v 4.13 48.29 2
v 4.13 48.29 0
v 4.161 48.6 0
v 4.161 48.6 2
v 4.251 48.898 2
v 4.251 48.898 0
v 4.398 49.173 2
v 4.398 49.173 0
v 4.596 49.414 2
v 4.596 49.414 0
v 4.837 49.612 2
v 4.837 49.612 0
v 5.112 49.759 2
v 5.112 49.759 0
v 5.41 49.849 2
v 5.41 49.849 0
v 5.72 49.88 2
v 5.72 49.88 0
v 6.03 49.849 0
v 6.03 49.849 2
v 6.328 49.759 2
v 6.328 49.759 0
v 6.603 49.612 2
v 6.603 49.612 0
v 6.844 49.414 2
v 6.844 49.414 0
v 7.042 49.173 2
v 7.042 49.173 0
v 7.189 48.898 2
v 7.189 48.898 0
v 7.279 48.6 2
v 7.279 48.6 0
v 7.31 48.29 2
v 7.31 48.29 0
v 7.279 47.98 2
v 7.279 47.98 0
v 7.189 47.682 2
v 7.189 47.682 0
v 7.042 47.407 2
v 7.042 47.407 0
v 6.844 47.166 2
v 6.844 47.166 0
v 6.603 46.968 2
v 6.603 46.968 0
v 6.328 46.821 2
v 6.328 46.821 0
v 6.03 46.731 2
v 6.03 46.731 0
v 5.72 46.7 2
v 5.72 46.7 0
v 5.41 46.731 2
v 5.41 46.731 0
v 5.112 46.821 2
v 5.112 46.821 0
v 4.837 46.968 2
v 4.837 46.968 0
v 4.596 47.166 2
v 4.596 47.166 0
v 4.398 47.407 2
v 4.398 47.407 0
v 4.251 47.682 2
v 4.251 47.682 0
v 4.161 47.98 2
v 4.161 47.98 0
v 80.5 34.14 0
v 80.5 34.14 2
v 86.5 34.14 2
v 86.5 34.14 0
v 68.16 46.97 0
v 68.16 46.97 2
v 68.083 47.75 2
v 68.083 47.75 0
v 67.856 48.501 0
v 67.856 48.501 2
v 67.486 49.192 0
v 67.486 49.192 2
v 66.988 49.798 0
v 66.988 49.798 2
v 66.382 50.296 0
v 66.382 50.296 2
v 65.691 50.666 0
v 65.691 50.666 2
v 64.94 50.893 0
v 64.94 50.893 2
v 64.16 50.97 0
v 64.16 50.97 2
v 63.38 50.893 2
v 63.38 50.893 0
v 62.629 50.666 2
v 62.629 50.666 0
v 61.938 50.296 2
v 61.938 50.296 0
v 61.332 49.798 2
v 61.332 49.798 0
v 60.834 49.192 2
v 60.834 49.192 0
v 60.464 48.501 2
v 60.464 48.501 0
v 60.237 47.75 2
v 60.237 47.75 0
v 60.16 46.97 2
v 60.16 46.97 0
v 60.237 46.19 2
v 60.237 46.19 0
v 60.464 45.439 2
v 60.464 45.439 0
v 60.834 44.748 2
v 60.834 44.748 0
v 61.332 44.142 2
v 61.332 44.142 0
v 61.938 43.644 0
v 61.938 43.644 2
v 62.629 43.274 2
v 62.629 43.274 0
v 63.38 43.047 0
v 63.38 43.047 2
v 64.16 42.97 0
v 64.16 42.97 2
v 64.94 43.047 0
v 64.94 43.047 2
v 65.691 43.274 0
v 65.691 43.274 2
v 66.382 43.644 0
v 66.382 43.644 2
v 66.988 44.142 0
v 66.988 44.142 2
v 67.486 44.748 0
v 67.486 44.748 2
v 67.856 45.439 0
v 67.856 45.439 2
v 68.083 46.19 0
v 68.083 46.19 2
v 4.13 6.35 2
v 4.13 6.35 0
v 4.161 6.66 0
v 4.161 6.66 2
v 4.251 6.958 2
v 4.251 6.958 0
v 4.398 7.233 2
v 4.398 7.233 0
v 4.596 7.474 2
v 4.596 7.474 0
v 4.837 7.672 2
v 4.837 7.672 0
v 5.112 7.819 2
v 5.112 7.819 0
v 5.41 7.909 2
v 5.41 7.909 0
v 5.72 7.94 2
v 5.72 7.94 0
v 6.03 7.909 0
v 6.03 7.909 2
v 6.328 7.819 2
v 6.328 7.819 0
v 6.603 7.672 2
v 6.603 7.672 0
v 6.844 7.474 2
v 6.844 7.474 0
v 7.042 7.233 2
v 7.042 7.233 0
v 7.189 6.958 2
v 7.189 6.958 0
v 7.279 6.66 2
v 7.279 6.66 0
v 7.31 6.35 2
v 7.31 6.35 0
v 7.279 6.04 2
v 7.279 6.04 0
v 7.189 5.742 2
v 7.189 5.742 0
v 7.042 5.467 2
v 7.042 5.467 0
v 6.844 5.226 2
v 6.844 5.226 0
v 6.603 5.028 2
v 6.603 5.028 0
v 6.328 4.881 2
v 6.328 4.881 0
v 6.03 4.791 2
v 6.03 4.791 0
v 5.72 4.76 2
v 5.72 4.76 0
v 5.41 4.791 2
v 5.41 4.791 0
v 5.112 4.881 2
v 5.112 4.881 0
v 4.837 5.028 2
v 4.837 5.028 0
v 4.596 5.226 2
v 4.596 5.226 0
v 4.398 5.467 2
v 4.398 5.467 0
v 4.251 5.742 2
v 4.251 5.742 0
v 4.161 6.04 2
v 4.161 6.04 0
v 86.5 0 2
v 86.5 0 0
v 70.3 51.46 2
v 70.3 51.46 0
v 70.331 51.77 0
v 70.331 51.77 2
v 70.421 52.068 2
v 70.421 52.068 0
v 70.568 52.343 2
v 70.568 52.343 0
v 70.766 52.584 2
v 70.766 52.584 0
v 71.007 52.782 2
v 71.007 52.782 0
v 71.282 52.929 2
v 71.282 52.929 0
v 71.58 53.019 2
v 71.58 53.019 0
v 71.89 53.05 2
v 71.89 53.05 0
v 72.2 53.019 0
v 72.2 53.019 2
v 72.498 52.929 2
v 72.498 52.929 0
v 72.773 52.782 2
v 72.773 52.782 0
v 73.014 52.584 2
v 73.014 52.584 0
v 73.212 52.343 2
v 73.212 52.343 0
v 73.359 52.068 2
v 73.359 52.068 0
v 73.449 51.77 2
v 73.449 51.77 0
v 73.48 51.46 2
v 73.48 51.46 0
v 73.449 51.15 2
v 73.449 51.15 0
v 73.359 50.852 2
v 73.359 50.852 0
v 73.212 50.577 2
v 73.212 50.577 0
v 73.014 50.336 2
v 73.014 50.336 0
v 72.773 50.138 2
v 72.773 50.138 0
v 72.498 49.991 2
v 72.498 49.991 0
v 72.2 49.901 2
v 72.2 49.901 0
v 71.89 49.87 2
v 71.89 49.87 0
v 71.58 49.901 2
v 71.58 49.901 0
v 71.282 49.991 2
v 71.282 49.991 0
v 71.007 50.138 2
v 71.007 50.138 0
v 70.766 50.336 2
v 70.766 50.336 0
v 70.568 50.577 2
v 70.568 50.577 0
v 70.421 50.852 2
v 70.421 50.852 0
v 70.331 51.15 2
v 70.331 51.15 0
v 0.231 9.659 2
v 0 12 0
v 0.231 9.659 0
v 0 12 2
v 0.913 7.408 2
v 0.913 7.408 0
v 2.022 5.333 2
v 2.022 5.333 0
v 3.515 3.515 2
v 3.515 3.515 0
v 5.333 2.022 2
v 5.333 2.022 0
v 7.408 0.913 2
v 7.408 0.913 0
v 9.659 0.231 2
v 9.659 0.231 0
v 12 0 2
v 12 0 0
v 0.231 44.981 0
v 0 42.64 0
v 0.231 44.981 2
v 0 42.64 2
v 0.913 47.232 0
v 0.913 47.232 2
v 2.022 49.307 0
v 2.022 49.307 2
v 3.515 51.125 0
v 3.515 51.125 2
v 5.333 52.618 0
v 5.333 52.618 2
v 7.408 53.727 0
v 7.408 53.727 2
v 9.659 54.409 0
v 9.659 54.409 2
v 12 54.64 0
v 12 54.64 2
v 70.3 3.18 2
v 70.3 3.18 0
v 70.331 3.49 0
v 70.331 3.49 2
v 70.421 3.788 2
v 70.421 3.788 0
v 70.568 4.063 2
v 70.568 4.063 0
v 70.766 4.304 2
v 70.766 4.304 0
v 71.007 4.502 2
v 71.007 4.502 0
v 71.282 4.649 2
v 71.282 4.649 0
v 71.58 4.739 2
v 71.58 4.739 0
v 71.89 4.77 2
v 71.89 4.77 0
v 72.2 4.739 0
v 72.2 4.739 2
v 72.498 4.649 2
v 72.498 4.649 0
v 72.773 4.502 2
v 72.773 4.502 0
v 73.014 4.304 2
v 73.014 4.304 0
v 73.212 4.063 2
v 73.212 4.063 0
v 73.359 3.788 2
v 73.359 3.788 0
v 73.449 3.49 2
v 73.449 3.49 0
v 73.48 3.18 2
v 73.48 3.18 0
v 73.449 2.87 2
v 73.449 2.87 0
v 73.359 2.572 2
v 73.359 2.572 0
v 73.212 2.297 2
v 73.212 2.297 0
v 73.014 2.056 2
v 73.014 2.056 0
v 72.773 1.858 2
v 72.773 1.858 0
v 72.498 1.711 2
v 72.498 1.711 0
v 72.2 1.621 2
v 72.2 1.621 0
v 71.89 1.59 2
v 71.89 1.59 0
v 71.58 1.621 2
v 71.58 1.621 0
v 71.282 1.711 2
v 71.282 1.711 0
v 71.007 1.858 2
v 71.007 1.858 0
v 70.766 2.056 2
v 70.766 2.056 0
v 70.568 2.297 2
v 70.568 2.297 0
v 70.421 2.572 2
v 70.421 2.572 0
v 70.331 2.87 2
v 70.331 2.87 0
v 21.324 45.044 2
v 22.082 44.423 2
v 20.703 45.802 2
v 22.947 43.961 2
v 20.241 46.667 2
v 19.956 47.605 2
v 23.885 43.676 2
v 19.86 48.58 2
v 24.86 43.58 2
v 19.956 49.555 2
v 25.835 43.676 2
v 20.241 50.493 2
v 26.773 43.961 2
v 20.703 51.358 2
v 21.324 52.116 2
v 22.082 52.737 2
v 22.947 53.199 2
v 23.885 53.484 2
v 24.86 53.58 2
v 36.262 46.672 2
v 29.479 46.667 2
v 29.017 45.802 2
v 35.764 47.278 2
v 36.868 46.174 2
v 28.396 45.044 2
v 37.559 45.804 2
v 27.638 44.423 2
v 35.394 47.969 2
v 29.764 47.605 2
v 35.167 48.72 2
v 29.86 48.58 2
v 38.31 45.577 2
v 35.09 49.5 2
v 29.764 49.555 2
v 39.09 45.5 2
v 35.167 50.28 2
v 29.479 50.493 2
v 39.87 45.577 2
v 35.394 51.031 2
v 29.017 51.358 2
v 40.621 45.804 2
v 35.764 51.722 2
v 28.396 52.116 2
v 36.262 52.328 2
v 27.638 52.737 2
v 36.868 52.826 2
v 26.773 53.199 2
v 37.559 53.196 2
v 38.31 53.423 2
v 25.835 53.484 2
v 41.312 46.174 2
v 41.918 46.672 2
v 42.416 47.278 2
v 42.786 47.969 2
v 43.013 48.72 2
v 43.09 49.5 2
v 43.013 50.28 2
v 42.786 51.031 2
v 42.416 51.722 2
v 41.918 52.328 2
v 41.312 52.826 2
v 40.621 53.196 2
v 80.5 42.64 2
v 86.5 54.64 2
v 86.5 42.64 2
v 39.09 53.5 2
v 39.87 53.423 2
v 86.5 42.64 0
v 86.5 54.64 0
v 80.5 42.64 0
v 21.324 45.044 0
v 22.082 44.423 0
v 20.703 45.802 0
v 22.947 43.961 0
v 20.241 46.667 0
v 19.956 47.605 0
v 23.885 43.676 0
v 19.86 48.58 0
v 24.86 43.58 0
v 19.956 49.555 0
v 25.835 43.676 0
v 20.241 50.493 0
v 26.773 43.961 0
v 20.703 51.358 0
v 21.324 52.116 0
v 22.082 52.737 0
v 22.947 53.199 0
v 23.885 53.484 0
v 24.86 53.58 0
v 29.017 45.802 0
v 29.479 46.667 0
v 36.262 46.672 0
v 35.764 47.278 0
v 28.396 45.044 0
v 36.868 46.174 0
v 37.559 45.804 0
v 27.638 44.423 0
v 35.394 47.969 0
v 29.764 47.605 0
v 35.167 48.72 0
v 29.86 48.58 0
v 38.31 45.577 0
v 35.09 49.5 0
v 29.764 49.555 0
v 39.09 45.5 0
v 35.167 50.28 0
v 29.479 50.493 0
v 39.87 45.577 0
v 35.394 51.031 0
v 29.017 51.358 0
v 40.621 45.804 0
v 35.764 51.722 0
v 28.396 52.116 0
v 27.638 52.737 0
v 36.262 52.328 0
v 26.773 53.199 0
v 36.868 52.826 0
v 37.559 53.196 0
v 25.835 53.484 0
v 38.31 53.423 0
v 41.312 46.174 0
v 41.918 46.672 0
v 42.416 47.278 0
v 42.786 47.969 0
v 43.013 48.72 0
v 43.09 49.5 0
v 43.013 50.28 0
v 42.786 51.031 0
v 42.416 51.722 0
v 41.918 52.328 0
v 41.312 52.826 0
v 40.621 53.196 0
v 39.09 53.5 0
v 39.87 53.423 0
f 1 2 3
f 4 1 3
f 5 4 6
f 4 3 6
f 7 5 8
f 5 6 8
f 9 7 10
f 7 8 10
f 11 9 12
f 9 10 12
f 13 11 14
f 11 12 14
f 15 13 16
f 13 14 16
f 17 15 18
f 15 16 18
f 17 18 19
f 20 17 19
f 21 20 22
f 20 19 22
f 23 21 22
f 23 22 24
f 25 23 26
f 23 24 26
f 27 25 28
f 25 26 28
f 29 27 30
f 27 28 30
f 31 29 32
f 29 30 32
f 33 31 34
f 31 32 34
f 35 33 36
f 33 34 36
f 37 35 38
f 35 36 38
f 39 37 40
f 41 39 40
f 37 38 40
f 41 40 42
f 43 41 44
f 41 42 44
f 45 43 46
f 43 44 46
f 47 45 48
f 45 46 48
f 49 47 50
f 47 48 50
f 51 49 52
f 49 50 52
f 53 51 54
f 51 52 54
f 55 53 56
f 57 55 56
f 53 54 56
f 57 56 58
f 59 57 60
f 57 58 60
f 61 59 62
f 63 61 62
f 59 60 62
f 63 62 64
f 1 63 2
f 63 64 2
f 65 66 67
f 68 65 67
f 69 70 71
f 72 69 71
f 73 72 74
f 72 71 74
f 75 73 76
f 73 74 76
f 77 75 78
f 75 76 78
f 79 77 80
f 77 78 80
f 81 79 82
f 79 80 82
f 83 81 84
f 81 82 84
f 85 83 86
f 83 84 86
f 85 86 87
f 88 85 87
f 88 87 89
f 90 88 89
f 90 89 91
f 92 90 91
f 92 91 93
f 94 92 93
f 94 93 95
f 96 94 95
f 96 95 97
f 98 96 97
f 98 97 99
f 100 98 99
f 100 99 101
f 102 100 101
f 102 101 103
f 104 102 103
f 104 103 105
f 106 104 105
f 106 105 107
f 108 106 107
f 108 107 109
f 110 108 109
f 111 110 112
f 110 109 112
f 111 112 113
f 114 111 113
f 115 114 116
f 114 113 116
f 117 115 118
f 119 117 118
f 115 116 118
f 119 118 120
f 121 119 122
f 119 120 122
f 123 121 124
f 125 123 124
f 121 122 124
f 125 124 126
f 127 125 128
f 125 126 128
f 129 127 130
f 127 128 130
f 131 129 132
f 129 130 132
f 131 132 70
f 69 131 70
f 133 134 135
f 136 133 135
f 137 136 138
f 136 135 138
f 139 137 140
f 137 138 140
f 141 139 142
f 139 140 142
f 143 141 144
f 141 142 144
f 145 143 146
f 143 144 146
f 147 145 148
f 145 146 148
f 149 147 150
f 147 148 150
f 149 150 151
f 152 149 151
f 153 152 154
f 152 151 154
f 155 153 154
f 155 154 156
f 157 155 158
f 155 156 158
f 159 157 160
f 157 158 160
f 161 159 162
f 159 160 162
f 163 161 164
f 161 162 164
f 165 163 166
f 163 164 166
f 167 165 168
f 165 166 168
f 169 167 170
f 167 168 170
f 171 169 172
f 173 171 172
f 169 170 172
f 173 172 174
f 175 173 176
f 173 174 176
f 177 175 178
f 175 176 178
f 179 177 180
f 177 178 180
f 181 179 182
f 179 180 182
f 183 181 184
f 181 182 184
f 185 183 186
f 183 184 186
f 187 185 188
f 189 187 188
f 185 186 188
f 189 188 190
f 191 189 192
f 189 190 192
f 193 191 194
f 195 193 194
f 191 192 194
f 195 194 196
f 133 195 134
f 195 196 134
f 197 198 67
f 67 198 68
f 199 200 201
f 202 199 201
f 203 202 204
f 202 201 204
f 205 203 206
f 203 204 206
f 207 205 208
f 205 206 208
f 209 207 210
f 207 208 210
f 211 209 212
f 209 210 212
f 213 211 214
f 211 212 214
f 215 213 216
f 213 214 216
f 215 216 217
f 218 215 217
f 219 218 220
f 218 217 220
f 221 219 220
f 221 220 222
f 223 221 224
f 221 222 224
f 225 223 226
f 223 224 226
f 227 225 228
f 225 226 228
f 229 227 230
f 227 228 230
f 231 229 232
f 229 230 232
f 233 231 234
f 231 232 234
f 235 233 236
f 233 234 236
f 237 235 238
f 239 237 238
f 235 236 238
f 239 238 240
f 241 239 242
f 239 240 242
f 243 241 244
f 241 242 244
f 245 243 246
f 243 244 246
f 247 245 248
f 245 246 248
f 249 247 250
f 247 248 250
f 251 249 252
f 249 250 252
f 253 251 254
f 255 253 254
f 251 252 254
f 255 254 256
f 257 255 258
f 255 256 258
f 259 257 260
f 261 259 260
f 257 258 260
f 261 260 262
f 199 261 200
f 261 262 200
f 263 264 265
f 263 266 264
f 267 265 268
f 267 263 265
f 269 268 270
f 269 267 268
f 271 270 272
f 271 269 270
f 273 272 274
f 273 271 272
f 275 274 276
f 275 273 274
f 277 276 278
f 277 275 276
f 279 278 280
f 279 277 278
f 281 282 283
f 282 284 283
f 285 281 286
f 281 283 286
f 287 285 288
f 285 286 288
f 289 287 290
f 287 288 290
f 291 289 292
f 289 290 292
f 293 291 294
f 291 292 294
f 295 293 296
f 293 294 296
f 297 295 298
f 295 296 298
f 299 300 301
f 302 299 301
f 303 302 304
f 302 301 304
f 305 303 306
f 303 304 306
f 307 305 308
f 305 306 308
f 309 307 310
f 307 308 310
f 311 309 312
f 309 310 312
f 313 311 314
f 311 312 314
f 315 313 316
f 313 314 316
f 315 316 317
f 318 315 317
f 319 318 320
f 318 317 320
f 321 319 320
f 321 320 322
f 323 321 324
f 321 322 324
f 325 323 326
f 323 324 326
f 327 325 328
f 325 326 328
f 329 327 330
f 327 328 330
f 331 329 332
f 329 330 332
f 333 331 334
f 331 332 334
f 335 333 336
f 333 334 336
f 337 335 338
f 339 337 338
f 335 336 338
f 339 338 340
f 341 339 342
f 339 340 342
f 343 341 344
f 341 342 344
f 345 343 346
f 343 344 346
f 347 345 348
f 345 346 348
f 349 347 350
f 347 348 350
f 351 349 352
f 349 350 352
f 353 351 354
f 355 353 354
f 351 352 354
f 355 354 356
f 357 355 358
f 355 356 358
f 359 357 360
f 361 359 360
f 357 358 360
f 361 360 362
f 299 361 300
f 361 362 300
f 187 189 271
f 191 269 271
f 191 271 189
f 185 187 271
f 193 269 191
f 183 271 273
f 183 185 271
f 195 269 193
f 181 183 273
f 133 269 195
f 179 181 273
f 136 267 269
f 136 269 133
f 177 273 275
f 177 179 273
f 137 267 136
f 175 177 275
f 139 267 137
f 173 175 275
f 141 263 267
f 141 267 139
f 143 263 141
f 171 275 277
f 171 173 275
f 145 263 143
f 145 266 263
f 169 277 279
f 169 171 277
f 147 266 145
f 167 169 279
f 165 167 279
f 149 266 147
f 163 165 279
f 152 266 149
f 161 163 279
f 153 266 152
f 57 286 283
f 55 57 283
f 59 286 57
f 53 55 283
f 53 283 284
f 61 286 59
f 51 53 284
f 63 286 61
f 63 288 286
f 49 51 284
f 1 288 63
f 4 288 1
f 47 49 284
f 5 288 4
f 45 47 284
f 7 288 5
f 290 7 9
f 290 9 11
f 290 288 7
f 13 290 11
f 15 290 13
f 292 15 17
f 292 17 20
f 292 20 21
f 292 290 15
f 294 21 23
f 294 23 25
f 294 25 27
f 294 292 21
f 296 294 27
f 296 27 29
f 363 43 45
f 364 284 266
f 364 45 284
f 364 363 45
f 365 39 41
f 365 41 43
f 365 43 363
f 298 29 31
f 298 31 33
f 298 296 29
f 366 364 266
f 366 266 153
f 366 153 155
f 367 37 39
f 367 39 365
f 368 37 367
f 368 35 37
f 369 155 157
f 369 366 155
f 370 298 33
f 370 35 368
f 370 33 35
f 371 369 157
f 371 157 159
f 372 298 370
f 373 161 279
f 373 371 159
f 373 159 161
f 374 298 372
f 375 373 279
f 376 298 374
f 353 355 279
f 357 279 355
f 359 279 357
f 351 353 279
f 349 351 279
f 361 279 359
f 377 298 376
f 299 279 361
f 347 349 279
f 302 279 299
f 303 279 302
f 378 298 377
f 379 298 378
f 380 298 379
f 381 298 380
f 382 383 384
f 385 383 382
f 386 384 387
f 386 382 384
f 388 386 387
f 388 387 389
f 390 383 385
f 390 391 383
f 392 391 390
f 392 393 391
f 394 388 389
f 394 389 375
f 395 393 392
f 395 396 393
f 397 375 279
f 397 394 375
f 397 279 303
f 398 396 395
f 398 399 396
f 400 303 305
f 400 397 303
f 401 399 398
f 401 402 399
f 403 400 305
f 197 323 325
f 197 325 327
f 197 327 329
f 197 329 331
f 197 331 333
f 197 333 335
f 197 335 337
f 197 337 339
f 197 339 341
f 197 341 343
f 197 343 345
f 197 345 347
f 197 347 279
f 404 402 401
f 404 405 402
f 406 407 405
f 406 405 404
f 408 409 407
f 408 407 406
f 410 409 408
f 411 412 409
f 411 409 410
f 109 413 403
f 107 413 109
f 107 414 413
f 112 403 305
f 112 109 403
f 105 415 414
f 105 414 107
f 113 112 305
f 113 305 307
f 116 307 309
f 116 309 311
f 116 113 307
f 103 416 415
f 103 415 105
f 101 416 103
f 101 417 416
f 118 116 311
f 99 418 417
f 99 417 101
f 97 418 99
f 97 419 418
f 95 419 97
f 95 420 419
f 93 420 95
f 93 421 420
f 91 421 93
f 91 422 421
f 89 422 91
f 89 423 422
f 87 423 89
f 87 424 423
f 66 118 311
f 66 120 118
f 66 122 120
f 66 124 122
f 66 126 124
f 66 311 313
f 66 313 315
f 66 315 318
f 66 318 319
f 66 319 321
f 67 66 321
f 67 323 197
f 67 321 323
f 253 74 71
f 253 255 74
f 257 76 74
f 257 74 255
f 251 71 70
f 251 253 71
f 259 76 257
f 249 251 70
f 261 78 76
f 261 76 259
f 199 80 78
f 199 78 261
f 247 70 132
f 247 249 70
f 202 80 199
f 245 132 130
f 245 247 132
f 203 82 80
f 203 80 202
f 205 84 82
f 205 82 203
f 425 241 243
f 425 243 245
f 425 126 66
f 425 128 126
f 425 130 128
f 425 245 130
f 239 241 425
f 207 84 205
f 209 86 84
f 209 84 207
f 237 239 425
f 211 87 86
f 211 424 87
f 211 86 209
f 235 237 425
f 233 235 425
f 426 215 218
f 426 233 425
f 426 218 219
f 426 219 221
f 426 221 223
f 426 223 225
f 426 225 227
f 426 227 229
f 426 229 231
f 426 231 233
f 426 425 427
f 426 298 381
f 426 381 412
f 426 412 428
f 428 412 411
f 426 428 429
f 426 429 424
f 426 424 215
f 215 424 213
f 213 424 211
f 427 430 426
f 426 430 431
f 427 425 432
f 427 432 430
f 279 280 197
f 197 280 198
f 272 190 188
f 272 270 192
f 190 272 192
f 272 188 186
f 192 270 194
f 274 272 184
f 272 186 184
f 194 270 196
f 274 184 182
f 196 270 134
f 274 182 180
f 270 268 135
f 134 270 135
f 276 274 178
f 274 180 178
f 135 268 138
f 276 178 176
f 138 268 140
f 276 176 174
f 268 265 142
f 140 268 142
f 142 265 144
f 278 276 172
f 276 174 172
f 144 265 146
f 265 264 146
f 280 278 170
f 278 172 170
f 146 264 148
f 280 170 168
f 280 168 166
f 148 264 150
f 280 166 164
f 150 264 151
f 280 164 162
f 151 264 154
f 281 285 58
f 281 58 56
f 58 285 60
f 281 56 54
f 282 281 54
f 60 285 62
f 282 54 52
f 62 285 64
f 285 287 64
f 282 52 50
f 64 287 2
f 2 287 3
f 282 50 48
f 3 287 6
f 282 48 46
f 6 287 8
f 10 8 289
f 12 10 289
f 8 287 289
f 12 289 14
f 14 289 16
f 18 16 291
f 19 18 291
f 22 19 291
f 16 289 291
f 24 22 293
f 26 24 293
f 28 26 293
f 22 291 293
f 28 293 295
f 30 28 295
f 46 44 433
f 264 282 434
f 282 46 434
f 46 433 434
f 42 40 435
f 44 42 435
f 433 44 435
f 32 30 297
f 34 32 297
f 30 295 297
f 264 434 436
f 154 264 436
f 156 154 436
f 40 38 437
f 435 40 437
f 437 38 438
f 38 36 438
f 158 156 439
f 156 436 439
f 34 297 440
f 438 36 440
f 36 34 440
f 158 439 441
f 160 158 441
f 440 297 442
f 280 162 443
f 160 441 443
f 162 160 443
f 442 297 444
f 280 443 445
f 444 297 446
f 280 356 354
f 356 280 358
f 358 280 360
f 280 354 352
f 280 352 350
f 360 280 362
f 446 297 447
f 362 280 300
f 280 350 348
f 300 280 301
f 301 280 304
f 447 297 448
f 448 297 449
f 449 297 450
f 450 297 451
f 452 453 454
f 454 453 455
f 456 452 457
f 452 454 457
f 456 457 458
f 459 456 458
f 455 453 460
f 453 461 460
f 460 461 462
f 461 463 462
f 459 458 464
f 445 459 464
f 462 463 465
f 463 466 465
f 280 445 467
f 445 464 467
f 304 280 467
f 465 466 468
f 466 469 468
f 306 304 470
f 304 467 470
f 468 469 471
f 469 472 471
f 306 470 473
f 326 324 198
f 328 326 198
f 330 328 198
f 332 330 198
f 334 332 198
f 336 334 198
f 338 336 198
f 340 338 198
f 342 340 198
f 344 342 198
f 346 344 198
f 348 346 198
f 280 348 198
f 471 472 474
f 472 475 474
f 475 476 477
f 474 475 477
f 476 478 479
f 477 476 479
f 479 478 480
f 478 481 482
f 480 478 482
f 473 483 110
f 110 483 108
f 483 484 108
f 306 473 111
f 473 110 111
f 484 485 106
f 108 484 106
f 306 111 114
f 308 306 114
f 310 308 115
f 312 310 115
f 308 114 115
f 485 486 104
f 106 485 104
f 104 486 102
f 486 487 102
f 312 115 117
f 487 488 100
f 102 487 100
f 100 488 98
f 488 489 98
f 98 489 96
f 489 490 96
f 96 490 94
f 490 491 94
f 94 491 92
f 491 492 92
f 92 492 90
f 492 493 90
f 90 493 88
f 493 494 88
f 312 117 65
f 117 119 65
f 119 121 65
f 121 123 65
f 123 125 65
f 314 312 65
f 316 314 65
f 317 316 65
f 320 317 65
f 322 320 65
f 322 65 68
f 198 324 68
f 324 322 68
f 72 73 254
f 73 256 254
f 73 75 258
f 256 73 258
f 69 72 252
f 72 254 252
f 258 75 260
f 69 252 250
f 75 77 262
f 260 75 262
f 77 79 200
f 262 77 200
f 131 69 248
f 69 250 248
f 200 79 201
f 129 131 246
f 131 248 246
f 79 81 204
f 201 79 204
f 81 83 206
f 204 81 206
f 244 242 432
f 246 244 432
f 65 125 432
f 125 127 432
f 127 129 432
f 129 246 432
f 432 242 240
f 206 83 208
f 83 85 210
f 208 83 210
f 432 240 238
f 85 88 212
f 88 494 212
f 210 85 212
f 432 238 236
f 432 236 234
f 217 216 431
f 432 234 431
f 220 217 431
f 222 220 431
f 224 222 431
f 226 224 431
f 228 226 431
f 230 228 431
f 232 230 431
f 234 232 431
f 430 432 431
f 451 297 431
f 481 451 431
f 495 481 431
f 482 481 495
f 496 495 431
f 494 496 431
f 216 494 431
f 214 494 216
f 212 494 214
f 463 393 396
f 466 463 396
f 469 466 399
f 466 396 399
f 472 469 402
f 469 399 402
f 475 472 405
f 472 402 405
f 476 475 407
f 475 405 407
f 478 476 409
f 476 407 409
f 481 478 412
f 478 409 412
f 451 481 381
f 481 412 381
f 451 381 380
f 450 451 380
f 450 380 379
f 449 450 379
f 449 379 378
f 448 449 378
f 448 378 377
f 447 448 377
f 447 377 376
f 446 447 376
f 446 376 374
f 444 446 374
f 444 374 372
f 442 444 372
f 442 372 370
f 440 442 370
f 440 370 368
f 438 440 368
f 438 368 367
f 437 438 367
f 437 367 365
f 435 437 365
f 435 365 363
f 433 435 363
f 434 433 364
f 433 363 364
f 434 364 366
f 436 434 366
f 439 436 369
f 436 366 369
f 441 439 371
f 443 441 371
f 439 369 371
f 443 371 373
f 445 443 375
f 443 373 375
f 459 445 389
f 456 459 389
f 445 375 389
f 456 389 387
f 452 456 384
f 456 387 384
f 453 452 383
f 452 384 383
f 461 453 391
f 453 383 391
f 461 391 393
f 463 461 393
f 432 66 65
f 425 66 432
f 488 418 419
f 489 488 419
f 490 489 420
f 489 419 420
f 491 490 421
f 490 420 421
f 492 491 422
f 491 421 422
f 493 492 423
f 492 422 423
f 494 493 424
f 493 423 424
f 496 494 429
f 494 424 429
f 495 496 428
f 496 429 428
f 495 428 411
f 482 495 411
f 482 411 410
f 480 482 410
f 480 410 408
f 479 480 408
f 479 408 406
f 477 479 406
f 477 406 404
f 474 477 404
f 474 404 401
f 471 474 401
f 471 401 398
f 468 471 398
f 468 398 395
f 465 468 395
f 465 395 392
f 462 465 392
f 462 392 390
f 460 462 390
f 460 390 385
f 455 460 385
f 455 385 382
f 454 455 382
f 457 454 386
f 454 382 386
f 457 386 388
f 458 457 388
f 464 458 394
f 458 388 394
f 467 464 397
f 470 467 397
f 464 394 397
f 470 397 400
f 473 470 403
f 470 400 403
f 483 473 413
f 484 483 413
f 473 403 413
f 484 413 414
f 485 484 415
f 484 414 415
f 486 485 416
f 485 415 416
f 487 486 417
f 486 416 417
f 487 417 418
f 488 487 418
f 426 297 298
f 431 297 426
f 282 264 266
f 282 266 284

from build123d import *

# Parameters (mm, degrees)
ESBO_O1_W                = 86.5
ESBO_O1_H                = 54.64
RESSALTO_EXTRUS_O2_DEPTH = 2
ESBO_O3_R                = 1.59
CORTE_EXTRUS_O1_DEPTH    = 2
FILETE1_R                = 12
FILETE2_R                = 12
ESBO_O4_R                = 5
ESBO_O4_R_2              = 4
ESBO_O4_W                = 6
ESBO_O4_H                = 8.5
CORTE_EXTRUS_O2_DEPTH    = 10


with BuildPart() as part:
    # Esboço1 → Ressalto-extrusão2 (new body)
    with BuildSketch(Plane.XY):
        with Locations((43.25, 27.32)):
            Rectangle(ESBO_O1_W, ESBO_O1_H)
    extrude(amount=RESSALTO_EXTRUS_O2_DEPTH)

    # Esboço3 → Corte-extrusão1 (cut)
    with BuildSketch(Plane(origin=(0, 0, 0), x_dir=(-1, 0, 0), z_dir=(0, 0, -1))):
        with Locations((-71.89, 51.46)):
            Circle(ESBO_O3_R)
        with Locations((-71.89, 3.18)):
            Circle(ESBO_O3_R)
        with Locations((-5.72, 6.35)):
            Circle(ESBO_O3_R)
        with Locations((-5.72, 48.29)):
            Circle(ESBO_O3_R)
    extrude(amount=-CORTE_EXTRUS_O1_DEPTH, mode=Mode.SUBTRACT)

    # Filete1
    filete1_edges = [part.edges().sort_by_distance(p)[0] for p in [
        (0, 54.64, 1),
    ]]
    fillet(filete1_edges, radius=FILETE1_R)

    # Filete2
    filete2_edges = [part.edges().sort_by_distance(p)[0] for p in [
        (0, 0, 1),
    ]]
    fillet(filete2_edges, radius=FILETE2_R)

    # Esboço4 → Corte-extrusão2 (cut)
    with BuildSketch(Plane.XY.offset(2)):
        with Locations((24.86, 48.58)):
            Circle(ESBO_O4_R)
        with Locations((39.09, 49.5)):
            Circle(ESBO_O4_R_2)
        with Locations((64.16, 46.97)):
            Circle(ESBO_O4_R_2)
        with Locations((83.5, 38.39)):
            Rectangle(ESBO_O4_W, ESBO_O4_H)
    extrude(amount=-CORTE_EXTRUS_O2_DEPTH, mode=Mode.SUBTRACT)


solid = part.part
